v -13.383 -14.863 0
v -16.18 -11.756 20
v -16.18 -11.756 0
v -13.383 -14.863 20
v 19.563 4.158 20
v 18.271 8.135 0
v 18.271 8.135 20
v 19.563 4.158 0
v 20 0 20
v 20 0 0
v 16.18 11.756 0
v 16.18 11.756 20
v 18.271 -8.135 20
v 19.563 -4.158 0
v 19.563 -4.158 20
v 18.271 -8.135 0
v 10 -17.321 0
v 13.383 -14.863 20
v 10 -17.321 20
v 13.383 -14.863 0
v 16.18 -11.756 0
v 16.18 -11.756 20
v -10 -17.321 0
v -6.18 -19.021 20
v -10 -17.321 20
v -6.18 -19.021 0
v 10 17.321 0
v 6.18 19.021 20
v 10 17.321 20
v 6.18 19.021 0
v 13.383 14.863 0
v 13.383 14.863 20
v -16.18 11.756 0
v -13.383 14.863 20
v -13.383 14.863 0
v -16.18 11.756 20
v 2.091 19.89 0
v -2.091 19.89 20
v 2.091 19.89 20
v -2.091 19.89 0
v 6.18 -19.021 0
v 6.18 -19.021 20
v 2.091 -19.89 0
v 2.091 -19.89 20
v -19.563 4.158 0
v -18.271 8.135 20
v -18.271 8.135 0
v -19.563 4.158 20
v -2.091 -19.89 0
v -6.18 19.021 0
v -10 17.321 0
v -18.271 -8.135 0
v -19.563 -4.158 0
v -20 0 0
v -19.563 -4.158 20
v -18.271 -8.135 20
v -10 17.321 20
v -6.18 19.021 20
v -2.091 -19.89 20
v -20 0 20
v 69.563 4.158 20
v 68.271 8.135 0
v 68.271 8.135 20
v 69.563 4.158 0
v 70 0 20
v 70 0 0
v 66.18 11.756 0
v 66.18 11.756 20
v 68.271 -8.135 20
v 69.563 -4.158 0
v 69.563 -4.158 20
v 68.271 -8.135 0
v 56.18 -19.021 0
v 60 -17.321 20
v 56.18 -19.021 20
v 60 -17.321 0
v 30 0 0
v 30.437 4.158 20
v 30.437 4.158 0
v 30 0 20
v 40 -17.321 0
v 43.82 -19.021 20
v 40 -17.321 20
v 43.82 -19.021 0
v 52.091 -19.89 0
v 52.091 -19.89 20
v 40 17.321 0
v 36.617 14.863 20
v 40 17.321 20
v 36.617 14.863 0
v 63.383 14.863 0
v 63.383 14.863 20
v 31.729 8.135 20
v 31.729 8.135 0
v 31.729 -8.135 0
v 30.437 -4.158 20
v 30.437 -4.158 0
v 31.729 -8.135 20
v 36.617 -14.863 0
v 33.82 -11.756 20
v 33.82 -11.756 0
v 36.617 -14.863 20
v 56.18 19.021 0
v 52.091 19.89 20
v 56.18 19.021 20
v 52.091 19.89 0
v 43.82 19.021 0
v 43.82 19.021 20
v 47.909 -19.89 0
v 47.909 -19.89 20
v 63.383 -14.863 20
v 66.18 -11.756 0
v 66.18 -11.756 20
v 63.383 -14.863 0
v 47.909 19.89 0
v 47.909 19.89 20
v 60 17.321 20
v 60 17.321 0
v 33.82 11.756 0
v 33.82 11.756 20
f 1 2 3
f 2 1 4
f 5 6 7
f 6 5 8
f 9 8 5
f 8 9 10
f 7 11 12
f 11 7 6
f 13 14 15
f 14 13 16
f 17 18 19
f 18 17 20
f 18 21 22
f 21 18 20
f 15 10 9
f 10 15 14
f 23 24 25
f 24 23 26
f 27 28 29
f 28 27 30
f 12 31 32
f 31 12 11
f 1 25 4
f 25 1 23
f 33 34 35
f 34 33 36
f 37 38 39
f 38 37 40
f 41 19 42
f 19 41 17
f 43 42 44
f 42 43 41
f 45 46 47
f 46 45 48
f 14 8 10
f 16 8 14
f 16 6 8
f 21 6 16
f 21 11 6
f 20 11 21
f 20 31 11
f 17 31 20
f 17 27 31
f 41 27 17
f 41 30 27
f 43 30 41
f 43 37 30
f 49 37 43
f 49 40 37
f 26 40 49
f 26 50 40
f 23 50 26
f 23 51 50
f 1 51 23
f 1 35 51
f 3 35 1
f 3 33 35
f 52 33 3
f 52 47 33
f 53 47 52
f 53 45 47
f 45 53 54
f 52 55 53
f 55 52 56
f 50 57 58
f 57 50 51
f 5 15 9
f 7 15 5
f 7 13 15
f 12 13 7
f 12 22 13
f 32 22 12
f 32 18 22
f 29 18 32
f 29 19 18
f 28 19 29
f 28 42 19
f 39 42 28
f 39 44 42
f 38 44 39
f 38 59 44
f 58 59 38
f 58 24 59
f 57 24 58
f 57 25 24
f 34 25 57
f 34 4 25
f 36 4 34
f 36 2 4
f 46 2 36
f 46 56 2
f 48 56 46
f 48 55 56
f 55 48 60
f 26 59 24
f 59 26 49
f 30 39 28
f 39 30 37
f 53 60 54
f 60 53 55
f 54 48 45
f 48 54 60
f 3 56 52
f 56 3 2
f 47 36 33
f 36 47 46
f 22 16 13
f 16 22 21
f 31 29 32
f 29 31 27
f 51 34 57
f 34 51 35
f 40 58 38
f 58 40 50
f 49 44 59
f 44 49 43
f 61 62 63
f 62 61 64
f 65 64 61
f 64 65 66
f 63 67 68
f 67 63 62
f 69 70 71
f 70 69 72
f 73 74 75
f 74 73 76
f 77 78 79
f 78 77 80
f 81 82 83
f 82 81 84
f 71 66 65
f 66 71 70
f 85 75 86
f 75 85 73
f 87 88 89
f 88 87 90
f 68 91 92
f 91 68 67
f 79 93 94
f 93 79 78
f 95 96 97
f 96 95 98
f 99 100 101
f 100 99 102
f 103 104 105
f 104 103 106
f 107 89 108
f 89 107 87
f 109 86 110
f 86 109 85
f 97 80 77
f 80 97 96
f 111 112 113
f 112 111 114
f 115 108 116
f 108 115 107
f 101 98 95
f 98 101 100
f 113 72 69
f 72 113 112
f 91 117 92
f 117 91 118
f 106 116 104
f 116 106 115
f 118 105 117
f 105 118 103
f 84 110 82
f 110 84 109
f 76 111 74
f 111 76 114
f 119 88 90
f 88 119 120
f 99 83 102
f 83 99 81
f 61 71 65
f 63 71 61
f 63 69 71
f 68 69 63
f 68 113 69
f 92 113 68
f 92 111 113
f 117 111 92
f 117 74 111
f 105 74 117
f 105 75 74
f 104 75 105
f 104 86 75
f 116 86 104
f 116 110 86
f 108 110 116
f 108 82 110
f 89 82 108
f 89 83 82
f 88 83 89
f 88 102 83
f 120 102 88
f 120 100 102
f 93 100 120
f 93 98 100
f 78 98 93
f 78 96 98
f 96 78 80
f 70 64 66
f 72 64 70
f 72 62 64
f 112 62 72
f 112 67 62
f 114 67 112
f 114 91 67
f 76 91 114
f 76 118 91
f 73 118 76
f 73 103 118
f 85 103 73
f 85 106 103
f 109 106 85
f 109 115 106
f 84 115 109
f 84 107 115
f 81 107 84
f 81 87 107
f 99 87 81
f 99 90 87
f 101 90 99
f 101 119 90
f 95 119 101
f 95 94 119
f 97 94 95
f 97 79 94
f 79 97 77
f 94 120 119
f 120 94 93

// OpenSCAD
x=10;

cylinder(h=20, r=x);

x=20;

translate([50,0,0]) 
cylinder(h=20, r=x);
